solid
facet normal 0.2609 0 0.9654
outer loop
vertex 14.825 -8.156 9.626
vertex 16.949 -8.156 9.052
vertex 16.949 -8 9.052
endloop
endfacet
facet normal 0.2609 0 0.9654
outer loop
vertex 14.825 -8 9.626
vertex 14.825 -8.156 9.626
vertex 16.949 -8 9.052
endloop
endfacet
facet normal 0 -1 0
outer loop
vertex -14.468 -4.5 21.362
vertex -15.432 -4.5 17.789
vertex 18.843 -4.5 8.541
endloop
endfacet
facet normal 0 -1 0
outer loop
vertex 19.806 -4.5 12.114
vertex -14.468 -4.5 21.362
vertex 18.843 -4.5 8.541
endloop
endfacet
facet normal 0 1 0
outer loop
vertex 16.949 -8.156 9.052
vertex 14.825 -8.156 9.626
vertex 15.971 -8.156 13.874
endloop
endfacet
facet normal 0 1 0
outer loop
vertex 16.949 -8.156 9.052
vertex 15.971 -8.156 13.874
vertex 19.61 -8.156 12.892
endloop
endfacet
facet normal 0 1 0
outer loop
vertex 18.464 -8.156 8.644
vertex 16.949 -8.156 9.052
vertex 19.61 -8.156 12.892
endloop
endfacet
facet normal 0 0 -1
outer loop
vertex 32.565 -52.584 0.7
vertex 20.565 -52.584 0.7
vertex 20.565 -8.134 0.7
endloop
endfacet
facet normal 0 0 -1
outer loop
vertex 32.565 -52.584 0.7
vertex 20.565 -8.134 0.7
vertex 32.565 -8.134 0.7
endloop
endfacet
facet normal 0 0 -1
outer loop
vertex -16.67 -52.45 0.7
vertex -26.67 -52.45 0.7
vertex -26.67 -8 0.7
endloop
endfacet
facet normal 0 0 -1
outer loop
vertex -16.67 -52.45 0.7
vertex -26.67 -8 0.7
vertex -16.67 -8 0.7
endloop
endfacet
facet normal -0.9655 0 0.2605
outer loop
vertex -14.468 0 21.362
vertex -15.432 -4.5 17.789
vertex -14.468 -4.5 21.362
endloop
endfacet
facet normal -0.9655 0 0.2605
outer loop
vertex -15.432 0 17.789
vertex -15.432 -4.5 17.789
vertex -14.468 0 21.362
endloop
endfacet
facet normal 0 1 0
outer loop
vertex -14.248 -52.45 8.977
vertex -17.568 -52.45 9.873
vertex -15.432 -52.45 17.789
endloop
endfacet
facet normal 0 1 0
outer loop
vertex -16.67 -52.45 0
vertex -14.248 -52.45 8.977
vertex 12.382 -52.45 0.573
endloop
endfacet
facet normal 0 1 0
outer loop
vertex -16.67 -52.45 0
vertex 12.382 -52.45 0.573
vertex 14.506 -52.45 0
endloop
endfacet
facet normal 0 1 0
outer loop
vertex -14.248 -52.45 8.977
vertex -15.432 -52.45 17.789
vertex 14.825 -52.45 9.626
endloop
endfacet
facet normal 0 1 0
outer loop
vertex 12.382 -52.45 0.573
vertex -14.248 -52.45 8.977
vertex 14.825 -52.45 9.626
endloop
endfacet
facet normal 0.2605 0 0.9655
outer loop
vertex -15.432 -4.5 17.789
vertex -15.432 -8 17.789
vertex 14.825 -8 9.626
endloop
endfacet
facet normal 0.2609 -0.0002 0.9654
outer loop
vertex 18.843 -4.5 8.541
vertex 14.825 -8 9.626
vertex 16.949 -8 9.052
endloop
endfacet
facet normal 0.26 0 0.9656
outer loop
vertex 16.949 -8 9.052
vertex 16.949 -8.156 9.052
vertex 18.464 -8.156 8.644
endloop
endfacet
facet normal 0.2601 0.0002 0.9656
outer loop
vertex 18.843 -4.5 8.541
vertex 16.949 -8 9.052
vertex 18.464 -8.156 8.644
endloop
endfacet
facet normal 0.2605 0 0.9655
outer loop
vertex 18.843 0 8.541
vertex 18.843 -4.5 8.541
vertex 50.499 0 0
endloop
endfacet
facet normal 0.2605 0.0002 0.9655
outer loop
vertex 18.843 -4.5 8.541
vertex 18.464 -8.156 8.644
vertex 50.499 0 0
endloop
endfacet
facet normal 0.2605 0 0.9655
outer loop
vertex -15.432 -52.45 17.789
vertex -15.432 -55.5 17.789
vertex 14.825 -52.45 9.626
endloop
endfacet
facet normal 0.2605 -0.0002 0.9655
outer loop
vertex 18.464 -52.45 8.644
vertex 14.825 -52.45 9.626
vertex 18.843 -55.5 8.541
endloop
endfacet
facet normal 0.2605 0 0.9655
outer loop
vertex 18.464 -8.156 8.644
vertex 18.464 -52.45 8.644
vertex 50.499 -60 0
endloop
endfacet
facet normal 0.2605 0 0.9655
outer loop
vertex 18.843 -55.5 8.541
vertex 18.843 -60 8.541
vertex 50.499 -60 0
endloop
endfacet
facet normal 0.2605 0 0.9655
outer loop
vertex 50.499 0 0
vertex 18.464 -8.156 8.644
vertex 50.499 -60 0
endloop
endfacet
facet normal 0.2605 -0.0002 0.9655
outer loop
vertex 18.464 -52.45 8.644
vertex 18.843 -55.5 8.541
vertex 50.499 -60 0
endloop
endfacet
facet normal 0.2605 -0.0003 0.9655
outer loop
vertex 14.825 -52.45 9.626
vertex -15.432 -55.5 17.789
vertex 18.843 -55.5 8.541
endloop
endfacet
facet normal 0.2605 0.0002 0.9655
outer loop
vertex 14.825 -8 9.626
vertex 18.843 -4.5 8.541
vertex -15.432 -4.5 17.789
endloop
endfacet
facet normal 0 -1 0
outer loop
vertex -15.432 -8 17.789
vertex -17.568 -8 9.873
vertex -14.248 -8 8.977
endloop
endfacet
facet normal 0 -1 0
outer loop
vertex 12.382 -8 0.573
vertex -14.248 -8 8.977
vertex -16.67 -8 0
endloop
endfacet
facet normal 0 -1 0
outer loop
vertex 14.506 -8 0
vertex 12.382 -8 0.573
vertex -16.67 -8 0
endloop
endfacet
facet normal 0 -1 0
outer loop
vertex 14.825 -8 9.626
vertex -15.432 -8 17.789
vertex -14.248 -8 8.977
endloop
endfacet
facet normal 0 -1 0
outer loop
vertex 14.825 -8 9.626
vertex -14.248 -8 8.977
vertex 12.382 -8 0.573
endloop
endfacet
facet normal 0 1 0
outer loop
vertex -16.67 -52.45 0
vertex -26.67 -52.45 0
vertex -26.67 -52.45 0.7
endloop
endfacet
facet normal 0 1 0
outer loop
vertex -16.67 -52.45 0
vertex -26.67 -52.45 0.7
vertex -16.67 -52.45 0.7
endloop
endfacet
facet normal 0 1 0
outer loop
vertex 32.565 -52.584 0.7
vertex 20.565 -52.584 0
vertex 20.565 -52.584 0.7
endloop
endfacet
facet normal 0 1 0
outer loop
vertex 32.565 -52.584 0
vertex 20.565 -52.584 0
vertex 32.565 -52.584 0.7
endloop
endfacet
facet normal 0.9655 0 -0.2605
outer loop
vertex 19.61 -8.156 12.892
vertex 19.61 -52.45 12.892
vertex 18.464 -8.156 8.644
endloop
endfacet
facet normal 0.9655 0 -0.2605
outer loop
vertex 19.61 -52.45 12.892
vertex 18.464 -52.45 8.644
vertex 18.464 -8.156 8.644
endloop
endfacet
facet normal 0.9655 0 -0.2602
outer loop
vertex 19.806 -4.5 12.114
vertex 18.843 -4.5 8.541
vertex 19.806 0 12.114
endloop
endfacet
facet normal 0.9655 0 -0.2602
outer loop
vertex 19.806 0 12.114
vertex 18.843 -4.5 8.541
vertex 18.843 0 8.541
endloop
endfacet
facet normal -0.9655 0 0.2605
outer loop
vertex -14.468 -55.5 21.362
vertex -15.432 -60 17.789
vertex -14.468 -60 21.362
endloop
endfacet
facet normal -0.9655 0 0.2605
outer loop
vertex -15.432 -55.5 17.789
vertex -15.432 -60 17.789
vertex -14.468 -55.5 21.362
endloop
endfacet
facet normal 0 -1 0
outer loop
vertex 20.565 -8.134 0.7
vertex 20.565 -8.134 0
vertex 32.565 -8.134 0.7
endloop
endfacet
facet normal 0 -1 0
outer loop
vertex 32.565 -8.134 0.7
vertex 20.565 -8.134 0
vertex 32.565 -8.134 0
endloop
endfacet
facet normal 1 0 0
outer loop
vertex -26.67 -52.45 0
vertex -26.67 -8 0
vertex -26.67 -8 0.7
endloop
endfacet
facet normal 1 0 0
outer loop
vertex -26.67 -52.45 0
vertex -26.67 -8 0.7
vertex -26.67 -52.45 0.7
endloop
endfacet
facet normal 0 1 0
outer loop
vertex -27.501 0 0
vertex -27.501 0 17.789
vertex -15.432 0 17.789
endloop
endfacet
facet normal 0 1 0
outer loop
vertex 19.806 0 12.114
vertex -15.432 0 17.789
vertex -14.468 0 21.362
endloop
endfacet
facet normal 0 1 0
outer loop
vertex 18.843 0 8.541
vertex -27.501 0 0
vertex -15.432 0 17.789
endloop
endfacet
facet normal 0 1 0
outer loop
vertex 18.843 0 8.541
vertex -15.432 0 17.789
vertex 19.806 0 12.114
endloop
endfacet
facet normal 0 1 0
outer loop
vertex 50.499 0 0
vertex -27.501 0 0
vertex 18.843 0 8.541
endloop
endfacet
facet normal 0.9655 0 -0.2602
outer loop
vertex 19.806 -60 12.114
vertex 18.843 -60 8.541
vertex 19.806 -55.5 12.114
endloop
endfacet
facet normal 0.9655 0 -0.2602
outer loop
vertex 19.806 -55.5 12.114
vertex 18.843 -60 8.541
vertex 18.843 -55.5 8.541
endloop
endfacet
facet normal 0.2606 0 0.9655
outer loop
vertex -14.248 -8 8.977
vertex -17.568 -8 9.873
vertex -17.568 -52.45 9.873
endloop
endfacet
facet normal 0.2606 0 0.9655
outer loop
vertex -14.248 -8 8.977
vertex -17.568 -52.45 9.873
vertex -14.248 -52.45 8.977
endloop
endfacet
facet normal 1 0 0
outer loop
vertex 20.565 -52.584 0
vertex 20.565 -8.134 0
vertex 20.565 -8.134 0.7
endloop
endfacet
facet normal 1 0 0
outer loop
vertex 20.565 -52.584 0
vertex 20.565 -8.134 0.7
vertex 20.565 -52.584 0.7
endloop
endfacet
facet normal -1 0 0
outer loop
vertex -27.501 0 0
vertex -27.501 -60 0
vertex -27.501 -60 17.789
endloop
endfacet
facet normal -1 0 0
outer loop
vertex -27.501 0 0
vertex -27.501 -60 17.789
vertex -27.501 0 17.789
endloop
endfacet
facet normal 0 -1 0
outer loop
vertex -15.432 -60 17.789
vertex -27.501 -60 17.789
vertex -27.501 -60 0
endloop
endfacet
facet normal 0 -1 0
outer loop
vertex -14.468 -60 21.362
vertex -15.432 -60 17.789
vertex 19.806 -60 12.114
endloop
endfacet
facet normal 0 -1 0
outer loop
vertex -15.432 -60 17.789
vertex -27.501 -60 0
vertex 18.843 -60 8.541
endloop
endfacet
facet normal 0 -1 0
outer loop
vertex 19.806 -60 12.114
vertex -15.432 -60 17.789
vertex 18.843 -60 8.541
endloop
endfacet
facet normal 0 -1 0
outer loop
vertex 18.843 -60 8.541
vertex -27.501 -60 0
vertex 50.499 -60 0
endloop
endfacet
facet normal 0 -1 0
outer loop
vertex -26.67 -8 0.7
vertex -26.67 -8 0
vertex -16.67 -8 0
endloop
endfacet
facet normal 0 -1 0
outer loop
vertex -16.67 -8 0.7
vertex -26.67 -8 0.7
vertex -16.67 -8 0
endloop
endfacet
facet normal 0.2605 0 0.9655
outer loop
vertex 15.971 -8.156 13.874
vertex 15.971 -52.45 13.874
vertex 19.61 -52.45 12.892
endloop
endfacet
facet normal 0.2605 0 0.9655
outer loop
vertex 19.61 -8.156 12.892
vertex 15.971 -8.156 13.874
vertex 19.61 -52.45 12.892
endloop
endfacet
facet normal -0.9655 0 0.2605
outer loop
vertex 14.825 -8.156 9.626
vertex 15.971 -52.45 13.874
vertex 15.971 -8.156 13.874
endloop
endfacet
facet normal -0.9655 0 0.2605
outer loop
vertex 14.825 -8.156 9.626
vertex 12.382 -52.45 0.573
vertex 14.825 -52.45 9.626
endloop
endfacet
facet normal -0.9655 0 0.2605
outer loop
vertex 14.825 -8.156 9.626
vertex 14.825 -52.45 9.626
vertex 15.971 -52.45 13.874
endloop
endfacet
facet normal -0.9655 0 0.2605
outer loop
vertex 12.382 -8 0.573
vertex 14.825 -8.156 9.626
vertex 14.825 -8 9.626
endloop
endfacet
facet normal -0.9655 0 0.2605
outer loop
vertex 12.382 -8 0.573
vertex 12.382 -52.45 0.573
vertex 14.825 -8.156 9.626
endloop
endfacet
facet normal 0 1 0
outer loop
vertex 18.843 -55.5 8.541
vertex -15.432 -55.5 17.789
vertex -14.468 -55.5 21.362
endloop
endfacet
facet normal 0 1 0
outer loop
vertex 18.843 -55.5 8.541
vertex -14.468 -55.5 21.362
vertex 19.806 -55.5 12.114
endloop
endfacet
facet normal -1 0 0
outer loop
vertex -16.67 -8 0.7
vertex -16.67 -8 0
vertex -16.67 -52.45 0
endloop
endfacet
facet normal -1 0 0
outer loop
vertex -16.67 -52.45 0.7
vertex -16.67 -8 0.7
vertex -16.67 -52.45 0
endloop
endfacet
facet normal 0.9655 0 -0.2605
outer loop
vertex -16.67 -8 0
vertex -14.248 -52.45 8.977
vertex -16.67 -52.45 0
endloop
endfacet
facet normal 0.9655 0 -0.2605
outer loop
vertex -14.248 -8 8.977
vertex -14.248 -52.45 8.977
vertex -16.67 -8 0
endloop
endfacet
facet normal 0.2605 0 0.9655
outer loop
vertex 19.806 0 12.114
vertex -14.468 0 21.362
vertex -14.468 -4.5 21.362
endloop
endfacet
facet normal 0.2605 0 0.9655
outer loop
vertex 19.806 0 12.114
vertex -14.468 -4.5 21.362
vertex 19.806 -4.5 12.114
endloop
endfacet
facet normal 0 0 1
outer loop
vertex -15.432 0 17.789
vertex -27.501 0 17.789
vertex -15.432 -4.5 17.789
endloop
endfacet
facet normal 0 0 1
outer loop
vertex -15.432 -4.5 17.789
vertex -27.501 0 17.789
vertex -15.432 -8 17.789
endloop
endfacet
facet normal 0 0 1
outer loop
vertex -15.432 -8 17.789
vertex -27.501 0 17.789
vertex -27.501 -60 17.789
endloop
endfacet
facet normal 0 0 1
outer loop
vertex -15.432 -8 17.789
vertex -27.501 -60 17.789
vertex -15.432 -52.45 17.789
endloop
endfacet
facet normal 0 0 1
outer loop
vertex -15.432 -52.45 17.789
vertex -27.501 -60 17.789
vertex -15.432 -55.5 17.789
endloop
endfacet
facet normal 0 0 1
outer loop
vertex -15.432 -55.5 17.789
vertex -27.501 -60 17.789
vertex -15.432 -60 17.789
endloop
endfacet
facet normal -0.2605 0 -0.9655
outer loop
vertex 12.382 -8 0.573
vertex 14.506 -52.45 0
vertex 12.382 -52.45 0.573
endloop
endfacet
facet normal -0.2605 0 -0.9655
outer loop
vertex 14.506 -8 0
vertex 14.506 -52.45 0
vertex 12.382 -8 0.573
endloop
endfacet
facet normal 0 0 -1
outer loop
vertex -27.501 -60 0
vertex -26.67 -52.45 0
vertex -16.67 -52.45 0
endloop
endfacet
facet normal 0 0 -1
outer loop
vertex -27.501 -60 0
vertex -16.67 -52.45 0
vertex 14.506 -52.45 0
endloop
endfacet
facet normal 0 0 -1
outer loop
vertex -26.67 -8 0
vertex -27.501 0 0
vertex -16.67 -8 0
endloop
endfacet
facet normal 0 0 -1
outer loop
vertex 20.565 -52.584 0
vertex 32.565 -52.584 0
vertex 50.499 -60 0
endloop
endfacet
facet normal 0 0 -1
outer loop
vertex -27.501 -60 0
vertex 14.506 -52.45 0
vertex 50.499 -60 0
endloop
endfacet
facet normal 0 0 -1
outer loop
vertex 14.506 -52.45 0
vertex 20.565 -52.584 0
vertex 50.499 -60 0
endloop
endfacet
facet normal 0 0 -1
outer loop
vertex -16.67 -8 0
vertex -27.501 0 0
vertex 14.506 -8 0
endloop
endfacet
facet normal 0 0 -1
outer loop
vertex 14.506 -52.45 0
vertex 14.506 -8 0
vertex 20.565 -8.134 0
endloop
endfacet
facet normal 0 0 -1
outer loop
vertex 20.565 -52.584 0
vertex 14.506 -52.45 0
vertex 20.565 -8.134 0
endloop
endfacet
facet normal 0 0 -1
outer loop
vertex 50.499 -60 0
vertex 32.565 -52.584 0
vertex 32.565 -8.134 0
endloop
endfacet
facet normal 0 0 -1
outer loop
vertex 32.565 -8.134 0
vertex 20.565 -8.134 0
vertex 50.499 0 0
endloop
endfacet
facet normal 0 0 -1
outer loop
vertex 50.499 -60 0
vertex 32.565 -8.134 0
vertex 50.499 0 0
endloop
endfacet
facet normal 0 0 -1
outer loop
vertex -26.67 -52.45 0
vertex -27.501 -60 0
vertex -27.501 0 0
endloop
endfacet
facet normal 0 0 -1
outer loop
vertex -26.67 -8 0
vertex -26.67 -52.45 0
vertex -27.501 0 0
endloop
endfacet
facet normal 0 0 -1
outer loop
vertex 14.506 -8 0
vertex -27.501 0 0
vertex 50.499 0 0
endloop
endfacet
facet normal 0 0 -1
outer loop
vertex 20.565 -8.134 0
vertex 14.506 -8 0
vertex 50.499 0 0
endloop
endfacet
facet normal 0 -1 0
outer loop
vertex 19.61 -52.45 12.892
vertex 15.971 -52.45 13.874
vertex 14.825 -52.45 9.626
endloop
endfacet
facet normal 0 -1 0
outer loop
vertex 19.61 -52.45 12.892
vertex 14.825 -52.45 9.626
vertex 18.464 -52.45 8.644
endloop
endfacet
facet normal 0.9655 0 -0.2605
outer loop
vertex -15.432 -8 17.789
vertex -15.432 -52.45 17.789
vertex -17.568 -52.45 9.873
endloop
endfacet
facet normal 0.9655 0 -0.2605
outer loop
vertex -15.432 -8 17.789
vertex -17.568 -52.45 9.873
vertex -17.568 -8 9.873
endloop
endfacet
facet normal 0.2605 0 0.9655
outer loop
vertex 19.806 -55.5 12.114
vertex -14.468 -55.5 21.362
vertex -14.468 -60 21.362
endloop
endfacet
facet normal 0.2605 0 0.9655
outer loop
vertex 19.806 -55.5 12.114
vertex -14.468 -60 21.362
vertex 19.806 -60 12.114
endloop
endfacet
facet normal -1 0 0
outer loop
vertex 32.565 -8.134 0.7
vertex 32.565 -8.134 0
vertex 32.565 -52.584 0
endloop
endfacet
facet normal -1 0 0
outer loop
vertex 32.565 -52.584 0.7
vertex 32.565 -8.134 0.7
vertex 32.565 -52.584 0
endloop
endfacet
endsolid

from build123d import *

# Parameters (mm, degrees)
F0_W      = 100
F0_H      = 60
F1_DEPTH  = 31
F3_DEPTH  = 60.001
F4_W      = 30.1
F4_H      = 44.45
F5_DEPTH  = 26.0514508643
F6_W      = 3.4385170311
F6_H      = 44.45
F7_DEPTH  = 8.2
F8_DEPTH  = 2.2
F9_DEPTH  = 22
F10_W     = 3.7688823059
F10_H     = 44.2940850452
F11_DEPTH = 3.6
F12_W     = 35.5
F12_H     = 4.5
F13_DEPTH = 3.7
F14_DEPTH = 0.8
F15_W     = 12
F15_H     = 44.45
F17_DEPTH = 0.7
F18_W     = 10
F18_H     = 44.45
F19_DEPTH = 0.7
F21_DEPTH = 70.6


with BuildPart() as f1:
    # F0 (on Top) → F1 (new body)
    with BuildSketch(Plane.XY):
        with Locations((0.4987093992, -30)):
            Rectangle(F0_W, F0_H)
    extrude(amount=F1_DEPTH)

    # F2 (on face) → F3 (cut, through all)
    with BuildSketch(Plane.XZ.offset(60)):
        Polygon((-49.5012906008, 26.9820707818), (50.4987093992, 0), (50.4987093992, 31), (-49.5012906008, 31), align=None)
    extrude(amount=-F3_DEPTH, mode=Mode.SUBTRACT)

    # F4 (on face) → F5 (cut, through all)
    with BuildSketch(Plane(origin=(3.4269736671, 0, 12.7009290534), x_dir=(0.9654726309, 0, -0.2605045086), z_dir=(0.2605045086, 0, 0.9654726309))):
        with Locations((-1.0446142405, -30.225)):
            Rectangle(F4_W, F4_H)
    extrude(amount=-F5_DEPTH, mode=Mode.SUBTRACT)

    # F6 (on face) → F7 (cut)
    with BuildSketch(Plane(origin=(3.4269736671, 0, 12.7009290534), x_dir=(0.9654726309, 0, -0.2605045086), z_dir=(0.2605045086, 0, 0.9654726309))):
        with Locations((-17.8138727561, -30.225)):
            Rectangle(F6_W, F6_H)
    extrude(amount=-F7_DEPTH, mode=Mode.SUBTRACT)

    # F8 (add): a face of the model
    f8_faces = [f1.faces().sort_by_distance(p)[0] for p in [
        (15.7275193268, -30.225, 4.5262314589),
    ]]
    extrude(f8_faces, amount=F8_DEPTH)

    # F9 (cut): a face of the model
    f9_faces = [f1.faces().sort_by_distance(p)[0] for p in [
        (-49.5012906008, -30, 13.4910353909),
    ]]
    extrude(f9_faces, amount=-F9_DEPTH, mode=Mode.SUBTRACT)

    # F10 (on face) → F11 (join)
    with BuildSketch(Plane(origin=(3.4269736671, 0, 12.7009290534), x_dir=(0.9654726309, 0, -0.2605045086), z_dir=(0.2605045086, 0, 0.9654726309))):
        with Locations((13.6898269124, -30.3029574774)):
            Rectangle(F10_W, F10_H)
    extrude(amount=F11_DEPTH)

    # F12 (on face) → F13 (join)
    with BuildSketch(Plane(origin=(3.4269736671, 0, 12.7009290534), x_dir=(0.9654726309, 0, -0.2605045086), z_dir=(0.2605045086, 0, 0.9654726309))):
        with Locations((-1.7831312716, -2.25)):
            Rectangle(F12_W, F12_H)
        with Locations((-1.7831312716, -57.75)):
            Rectangle(F12_W, F12_H)
    extrude(amount=F13_DEPTH)

    # F14 (add): a face of the model
    f14_faces = [f1.faces().sort_by_distance(p)[0] for p in [
        (17.5819431037, -30.3029574774, 12.6103688914),
    ]]
    extrude(f14_faces, amount=F14_DEPTH)

    # F15 (on face) → F17 (cut)
    with BuildSketch(Plane(origin=(0, 0, 0), x_dir=(1, 0, 0), z_dir=(0, 0, -1))):
        with Locations((26.5654576292, 30.3591284901)):
            Rectangle(F15_W, F15_H)
    extrude(amount=-F17_DEPTH, mode=Mode.SUBTRACT)

    # F18 (on face) → F19 (cut)
    with BuildSketch(Plane(origin=(0, 0, 0), x_dir=(1, 0, 0), z_dir=(0, 0, -1))):
        with Locations((-21.6701921171, 30.225)):
            Rectangle(F18_W, F18_H)
    extrude(amount=-F19_DEPTH, mode=Mode.SUBTRACT)

    # F20 (on face) → F21 (cut)
    with BuildSketch(Plane.XZ.offset(60)):
        Polygon((-27.5012906008, 17.7893978176), (-15.431729971, 17.7893978176), (-27.5012906008, 21.0460152098), align=None)
    extrude(amount=-F21_DEPTH, mode=Mode.SUBTRACT)


solid = f1.part
